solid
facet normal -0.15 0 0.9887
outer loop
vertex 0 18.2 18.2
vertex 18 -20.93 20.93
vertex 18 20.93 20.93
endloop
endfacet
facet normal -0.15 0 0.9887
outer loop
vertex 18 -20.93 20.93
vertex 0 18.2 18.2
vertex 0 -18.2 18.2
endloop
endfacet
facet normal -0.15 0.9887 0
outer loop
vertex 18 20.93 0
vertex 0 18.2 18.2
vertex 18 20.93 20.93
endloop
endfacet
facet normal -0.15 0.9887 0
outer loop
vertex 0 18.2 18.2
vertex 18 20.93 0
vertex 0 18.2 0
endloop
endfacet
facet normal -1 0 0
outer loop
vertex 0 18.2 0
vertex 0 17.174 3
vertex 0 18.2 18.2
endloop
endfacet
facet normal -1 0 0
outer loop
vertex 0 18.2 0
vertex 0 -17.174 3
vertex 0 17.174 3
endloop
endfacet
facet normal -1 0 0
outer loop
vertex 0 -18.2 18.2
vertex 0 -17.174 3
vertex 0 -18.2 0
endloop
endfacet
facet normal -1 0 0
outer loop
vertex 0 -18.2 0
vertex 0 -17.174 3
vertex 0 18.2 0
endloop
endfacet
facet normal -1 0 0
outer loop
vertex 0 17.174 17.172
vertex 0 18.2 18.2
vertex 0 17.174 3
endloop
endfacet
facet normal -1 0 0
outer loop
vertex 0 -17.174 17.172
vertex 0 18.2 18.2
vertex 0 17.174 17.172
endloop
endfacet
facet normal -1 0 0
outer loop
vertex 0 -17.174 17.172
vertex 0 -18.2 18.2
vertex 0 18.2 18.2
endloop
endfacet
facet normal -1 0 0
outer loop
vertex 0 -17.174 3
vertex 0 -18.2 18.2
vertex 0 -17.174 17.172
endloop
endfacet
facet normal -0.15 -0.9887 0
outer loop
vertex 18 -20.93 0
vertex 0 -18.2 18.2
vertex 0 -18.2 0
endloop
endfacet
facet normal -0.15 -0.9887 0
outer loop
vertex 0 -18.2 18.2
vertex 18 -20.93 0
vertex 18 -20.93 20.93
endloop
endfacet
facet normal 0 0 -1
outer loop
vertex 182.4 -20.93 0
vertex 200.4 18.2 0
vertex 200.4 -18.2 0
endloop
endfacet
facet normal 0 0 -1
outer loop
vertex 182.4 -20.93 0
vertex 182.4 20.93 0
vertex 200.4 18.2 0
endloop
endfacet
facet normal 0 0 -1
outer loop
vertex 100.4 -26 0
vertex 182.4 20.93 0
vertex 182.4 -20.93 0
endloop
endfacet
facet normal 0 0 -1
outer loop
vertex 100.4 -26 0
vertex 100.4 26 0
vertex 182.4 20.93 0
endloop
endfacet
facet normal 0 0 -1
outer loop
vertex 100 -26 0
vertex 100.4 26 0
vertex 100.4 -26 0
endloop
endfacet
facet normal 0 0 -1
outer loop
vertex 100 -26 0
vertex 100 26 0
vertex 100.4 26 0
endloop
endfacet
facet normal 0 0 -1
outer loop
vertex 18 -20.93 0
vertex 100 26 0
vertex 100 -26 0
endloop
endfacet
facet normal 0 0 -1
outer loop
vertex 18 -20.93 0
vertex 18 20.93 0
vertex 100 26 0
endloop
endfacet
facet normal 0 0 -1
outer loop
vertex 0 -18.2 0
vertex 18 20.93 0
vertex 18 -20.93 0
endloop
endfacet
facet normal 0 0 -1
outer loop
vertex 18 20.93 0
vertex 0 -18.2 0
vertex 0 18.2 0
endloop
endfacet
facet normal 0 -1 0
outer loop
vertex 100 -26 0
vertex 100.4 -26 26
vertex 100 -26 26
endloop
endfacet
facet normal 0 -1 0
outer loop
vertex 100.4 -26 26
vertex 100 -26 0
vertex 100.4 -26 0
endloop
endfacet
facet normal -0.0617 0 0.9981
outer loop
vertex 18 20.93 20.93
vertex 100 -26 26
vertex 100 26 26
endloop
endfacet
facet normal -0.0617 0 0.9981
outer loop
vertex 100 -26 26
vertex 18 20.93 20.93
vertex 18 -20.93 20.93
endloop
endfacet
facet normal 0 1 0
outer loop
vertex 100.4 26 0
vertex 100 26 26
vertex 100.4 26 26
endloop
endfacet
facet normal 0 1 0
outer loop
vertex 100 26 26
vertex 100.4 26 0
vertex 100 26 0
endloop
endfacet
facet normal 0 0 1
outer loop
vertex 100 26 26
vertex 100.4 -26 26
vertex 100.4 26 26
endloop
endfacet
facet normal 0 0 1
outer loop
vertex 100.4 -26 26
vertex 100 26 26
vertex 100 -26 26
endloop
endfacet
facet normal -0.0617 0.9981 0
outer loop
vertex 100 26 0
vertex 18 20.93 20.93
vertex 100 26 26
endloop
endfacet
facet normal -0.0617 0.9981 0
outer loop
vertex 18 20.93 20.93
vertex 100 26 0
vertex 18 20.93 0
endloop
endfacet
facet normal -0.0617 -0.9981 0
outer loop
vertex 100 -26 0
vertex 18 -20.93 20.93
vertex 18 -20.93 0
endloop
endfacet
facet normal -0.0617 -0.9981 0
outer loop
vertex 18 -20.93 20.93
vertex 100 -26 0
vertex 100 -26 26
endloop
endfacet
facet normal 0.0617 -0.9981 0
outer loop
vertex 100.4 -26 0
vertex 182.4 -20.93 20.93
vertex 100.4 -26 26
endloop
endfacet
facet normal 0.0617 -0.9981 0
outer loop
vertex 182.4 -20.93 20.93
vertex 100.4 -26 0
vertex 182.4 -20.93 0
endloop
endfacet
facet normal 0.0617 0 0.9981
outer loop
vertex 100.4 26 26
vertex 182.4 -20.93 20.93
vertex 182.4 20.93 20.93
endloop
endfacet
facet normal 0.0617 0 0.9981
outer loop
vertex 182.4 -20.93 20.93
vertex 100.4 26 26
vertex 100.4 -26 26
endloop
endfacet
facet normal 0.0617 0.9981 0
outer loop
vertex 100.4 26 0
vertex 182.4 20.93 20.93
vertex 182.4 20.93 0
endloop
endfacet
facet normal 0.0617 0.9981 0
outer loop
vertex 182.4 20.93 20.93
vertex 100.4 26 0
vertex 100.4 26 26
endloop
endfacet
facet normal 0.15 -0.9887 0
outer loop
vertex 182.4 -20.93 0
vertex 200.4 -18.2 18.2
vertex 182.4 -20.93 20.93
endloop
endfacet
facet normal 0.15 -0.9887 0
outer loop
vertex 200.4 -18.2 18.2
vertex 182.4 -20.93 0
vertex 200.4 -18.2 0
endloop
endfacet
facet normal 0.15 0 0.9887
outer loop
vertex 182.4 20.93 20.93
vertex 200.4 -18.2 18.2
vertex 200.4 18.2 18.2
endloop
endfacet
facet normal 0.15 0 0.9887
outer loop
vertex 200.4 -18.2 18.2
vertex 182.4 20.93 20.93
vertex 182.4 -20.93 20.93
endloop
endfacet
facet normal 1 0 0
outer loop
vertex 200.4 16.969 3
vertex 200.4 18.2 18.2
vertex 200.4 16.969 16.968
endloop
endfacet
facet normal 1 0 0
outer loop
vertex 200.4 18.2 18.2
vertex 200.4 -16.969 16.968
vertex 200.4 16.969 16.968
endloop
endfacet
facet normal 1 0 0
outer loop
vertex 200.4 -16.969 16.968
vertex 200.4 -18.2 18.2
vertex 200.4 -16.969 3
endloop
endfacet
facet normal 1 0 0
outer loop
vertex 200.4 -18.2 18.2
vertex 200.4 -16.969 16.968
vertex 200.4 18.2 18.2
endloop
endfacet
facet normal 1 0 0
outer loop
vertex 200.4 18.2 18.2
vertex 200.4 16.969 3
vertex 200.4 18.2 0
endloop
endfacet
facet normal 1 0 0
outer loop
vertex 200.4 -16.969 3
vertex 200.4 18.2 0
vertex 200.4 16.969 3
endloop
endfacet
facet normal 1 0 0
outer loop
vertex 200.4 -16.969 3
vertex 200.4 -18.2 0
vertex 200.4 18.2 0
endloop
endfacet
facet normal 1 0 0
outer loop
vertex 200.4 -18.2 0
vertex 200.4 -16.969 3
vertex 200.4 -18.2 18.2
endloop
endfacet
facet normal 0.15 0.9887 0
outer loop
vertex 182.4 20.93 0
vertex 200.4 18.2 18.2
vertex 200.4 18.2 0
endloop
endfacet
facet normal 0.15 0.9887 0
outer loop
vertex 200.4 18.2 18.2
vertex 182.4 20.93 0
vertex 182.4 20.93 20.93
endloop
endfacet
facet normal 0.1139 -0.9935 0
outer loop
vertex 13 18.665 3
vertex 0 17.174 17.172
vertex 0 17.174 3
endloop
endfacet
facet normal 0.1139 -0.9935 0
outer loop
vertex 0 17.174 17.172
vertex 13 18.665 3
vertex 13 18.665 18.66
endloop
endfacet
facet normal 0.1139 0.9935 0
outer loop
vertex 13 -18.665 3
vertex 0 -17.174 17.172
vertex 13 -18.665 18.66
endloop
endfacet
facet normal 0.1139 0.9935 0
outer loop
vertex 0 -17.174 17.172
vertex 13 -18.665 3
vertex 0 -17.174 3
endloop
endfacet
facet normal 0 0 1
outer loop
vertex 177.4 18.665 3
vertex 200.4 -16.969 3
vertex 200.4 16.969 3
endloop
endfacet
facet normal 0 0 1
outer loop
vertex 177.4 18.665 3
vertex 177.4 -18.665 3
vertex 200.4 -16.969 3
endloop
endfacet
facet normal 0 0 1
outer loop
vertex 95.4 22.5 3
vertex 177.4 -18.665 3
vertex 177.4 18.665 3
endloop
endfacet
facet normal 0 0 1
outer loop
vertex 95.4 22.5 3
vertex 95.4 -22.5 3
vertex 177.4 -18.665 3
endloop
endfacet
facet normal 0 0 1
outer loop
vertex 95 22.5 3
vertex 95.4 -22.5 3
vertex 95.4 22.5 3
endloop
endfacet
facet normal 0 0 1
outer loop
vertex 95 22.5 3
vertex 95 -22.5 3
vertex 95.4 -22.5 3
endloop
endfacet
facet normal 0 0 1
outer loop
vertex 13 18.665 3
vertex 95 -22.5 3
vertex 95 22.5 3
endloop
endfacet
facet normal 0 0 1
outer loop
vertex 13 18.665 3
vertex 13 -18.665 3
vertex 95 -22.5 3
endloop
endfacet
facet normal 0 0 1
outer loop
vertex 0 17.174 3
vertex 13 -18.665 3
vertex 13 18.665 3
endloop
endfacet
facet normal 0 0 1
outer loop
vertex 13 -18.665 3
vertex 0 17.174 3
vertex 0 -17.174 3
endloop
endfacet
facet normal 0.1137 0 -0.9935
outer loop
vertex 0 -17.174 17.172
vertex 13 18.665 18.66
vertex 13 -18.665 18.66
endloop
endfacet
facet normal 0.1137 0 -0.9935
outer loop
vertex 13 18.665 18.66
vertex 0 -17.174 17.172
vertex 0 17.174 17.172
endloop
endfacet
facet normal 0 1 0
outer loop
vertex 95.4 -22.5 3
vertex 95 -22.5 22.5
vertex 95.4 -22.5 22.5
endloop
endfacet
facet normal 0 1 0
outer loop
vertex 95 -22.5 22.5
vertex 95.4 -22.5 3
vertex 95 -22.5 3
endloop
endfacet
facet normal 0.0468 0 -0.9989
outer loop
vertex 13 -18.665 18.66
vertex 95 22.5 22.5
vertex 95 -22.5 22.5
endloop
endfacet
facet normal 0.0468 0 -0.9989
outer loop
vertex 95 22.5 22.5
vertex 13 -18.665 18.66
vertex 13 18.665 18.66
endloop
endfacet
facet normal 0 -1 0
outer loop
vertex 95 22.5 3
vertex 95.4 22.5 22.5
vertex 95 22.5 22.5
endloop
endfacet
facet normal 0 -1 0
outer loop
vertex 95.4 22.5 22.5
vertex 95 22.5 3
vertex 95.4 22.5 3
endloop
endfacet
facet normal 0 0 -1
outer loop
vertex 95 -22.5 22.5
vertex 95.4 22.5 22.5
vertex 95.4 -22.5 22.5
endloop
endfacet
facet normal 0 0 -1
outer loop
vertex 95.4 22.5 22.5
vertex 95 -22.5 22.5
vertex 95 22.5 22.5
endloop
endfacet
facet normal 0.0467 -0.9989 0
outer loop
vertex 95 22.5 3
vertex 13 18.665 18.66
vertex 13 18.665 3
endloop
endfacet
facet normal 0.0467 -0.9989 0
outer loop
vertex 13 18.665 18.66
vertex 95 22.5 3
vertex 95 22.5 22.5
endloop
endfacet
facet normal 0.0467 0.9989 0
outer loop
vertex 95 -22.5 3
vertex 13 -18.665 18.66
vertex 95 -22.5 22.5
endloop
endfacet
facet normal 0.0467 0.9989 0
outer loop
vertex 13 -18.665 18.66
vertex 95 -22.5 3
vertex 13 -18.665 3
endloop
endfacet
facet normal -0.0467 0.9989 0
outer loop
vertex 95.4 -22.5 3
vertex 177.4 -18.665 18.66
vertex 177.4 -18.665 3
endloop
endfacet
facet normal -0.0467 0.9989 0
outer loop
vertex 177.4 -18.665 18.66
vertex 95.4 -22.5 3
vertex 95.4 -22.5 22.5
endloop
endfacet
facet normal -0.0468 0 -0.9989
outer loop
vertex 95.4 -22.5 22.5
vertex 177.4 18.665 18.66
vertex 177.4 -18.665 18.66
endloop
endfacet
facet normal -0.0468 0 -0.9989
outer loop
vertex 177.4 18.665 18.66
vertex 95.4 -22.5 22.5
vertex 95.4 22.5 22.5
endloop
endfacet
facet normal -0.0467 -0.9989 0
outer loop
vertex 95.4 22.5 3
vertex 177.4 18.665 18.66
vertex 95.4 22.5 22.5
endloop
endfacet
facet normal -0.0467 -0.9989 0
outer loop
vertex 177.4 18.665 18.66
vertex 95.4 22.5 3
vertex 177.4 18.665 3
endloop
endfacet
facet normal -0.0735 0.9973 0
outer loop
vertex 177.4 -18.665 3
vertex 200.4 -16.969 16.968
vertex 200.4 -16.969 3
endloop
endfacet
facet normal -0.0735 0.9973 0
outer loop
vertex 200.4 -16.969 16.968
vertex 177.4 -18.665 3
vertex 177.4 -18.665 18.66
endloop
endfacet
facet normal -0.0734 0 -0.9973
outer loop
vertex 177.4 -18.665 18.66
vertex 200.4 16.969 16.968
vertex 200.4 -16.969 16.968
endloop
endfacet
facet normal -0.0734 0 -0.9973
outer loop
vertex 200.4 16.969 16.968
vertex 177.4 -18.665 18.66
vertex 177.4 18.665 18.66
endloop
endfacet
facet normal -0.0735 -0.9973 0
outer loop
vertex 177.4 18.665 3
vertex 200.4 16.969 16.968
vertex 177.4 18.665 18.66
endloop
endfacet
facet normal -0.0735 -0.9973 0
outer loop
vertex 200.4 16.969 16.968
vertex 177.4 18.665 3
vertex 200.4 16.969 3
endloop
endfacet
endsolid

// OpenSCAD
$fn = 32;

// ----------------------------------------------------------------------
// Faired channel: 200 x 52 x 26 mm, 3.5 mm walls, faired ends
// ----------------------------------------------------------------------

// --- parameters (mm) ---
length = 200;             // channel length
width = 52;               // channel width at mid length
height = 26;              // channel height at mid length
wall = 3.5;               // side wall thickness
floor_t = 3;              // floor thickness
end_w = 36.4;             // faired end width
end_h = 18.2;             // faired end height

difference() {
  union() {
    hull() {
      translate([0, -18.2, 0]) cube([0.4, 36.4, 18.2]);
      translate([18, -20.93, 0]) cube([0.4, 41.86, 20.93]);
    }
    hull() {
      translate([18, -20.93, 0]) cube([0.4, 41.86, 20.93]);
      translate([100, -26, 0]) cube([0.4, 52, 26]);
    }
    hull() {
      translate([100, -26, 0]) cube([0.4, 52, 26]);
      translate([182, -20.93, 0]) cube([0.4, 41.86, 20.93]);
    }
    hull() {
      translate([182, -20.93, 0]) cube([0.4, 41.86, 20.93]);
      translate([200, -18.2, 0]) cube([0.4, 36.4, 18.2]);
    }
  }
  /* cavity, 5 mm proud of both ends so the ports are cut clean */
  hull() {
    translate([-5, -16.6, 3]) cube([0.4, 33.2, 13.6]);
    translate([13, -18.665, 3]) cube([0.4, 37.33, 15.66]);
  }
  hull() {
    translate([13, -18.665, 3]) cube([0.4, 37.33, 15.66]);
    translate([95, -22.5, 3]) cube([0.4, 45, 19.5]);
  }
  hull() {
    translate([95, -22.5, 3]) cube([0.4, 45, 19.5]);
    translate([177, -18.665, 3]) cube([0.4, 37.33, 15.66]);
  }
  hull() {
    translate([177, -18.665, 3]) cube([0.4, 37.33, 15.66]);
    translate([205, -16.6, 3]) cube([0.4, 33.2, 13.6]);
  }
}
